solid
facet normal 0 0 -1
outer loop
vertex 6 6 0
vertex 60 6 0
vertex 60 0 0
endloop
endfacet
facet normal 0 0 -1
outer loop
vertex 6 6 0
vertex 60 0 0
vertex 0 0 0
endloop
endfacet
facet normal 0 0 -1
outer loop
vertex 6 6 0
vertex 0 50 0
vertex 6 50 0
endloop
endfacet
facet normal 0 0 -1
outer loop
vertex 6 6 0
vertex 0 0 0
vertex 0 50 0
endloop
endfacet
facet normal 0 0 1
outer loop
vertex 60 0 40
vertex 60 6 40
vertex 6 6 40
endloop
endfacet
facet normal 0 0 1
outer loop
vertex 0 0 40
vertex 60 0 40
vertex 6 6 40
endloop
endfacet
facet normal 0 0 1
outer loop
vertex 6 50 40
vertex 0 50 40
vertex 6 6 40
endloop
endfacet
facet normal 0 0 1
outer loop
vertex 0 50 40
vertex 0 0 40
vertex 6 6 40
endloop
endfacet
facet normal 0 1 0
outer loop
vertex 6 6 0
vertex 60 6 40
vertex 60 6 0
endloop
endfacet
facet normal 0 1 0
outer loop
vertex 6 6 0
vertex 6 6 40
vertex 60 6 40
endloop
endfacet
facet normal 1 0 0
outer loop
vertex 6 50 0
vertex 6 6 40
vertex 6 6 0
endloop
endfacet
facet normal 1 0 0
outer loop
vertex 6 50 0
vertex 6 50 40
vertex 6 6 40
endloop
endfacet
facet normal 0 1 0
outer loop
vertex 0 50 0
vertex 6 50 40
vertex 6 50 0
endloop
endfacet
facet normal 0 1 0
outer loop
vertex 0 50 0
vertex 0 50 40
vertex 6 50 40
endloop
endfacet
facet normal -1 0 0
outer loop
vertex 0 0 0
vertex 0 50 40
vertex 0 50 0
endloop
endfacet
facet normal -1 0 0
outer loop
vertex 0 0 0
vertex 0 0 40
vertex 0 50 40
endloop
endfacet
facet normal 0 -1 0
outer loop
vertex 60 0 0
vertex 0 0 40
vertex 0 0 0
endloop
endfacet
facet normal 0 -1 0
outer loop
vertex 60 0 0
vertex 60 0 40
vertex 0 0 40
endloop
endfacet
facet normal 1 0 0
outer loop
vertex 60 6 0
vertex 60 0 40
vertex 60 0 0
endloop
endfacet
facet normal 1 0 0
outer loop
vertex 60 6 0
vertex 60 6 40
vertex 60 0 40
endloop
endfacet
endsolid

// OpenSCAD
$fn = 32;

// ----------------------------------------------------------------------
// Structural section: angle 60 x 50 mm
// ----------------------------------------------------------------------

// --- parameters (mm) ---
sec_w = 60;               // leg width, X
sec_h = 50;               // leg height, Y
flange_t = 6;             // leg thickness
plate_t = 40;             // cut length, Z (extrusion height)
fit_tol = 0.02;           // declared fit tolerance (prompt contract)
free_tol = 0.2;           // declared free tolerance (prompt contract)

profile = [[0, 0], [60, 0], [60, 6], [6, 6], [6, 50], [0, 50]];  // primary outline, 6 points, counter clockwise

// --- the one profile operation ---
linear_extrude(height = plate_t) polygon(points = profile);
